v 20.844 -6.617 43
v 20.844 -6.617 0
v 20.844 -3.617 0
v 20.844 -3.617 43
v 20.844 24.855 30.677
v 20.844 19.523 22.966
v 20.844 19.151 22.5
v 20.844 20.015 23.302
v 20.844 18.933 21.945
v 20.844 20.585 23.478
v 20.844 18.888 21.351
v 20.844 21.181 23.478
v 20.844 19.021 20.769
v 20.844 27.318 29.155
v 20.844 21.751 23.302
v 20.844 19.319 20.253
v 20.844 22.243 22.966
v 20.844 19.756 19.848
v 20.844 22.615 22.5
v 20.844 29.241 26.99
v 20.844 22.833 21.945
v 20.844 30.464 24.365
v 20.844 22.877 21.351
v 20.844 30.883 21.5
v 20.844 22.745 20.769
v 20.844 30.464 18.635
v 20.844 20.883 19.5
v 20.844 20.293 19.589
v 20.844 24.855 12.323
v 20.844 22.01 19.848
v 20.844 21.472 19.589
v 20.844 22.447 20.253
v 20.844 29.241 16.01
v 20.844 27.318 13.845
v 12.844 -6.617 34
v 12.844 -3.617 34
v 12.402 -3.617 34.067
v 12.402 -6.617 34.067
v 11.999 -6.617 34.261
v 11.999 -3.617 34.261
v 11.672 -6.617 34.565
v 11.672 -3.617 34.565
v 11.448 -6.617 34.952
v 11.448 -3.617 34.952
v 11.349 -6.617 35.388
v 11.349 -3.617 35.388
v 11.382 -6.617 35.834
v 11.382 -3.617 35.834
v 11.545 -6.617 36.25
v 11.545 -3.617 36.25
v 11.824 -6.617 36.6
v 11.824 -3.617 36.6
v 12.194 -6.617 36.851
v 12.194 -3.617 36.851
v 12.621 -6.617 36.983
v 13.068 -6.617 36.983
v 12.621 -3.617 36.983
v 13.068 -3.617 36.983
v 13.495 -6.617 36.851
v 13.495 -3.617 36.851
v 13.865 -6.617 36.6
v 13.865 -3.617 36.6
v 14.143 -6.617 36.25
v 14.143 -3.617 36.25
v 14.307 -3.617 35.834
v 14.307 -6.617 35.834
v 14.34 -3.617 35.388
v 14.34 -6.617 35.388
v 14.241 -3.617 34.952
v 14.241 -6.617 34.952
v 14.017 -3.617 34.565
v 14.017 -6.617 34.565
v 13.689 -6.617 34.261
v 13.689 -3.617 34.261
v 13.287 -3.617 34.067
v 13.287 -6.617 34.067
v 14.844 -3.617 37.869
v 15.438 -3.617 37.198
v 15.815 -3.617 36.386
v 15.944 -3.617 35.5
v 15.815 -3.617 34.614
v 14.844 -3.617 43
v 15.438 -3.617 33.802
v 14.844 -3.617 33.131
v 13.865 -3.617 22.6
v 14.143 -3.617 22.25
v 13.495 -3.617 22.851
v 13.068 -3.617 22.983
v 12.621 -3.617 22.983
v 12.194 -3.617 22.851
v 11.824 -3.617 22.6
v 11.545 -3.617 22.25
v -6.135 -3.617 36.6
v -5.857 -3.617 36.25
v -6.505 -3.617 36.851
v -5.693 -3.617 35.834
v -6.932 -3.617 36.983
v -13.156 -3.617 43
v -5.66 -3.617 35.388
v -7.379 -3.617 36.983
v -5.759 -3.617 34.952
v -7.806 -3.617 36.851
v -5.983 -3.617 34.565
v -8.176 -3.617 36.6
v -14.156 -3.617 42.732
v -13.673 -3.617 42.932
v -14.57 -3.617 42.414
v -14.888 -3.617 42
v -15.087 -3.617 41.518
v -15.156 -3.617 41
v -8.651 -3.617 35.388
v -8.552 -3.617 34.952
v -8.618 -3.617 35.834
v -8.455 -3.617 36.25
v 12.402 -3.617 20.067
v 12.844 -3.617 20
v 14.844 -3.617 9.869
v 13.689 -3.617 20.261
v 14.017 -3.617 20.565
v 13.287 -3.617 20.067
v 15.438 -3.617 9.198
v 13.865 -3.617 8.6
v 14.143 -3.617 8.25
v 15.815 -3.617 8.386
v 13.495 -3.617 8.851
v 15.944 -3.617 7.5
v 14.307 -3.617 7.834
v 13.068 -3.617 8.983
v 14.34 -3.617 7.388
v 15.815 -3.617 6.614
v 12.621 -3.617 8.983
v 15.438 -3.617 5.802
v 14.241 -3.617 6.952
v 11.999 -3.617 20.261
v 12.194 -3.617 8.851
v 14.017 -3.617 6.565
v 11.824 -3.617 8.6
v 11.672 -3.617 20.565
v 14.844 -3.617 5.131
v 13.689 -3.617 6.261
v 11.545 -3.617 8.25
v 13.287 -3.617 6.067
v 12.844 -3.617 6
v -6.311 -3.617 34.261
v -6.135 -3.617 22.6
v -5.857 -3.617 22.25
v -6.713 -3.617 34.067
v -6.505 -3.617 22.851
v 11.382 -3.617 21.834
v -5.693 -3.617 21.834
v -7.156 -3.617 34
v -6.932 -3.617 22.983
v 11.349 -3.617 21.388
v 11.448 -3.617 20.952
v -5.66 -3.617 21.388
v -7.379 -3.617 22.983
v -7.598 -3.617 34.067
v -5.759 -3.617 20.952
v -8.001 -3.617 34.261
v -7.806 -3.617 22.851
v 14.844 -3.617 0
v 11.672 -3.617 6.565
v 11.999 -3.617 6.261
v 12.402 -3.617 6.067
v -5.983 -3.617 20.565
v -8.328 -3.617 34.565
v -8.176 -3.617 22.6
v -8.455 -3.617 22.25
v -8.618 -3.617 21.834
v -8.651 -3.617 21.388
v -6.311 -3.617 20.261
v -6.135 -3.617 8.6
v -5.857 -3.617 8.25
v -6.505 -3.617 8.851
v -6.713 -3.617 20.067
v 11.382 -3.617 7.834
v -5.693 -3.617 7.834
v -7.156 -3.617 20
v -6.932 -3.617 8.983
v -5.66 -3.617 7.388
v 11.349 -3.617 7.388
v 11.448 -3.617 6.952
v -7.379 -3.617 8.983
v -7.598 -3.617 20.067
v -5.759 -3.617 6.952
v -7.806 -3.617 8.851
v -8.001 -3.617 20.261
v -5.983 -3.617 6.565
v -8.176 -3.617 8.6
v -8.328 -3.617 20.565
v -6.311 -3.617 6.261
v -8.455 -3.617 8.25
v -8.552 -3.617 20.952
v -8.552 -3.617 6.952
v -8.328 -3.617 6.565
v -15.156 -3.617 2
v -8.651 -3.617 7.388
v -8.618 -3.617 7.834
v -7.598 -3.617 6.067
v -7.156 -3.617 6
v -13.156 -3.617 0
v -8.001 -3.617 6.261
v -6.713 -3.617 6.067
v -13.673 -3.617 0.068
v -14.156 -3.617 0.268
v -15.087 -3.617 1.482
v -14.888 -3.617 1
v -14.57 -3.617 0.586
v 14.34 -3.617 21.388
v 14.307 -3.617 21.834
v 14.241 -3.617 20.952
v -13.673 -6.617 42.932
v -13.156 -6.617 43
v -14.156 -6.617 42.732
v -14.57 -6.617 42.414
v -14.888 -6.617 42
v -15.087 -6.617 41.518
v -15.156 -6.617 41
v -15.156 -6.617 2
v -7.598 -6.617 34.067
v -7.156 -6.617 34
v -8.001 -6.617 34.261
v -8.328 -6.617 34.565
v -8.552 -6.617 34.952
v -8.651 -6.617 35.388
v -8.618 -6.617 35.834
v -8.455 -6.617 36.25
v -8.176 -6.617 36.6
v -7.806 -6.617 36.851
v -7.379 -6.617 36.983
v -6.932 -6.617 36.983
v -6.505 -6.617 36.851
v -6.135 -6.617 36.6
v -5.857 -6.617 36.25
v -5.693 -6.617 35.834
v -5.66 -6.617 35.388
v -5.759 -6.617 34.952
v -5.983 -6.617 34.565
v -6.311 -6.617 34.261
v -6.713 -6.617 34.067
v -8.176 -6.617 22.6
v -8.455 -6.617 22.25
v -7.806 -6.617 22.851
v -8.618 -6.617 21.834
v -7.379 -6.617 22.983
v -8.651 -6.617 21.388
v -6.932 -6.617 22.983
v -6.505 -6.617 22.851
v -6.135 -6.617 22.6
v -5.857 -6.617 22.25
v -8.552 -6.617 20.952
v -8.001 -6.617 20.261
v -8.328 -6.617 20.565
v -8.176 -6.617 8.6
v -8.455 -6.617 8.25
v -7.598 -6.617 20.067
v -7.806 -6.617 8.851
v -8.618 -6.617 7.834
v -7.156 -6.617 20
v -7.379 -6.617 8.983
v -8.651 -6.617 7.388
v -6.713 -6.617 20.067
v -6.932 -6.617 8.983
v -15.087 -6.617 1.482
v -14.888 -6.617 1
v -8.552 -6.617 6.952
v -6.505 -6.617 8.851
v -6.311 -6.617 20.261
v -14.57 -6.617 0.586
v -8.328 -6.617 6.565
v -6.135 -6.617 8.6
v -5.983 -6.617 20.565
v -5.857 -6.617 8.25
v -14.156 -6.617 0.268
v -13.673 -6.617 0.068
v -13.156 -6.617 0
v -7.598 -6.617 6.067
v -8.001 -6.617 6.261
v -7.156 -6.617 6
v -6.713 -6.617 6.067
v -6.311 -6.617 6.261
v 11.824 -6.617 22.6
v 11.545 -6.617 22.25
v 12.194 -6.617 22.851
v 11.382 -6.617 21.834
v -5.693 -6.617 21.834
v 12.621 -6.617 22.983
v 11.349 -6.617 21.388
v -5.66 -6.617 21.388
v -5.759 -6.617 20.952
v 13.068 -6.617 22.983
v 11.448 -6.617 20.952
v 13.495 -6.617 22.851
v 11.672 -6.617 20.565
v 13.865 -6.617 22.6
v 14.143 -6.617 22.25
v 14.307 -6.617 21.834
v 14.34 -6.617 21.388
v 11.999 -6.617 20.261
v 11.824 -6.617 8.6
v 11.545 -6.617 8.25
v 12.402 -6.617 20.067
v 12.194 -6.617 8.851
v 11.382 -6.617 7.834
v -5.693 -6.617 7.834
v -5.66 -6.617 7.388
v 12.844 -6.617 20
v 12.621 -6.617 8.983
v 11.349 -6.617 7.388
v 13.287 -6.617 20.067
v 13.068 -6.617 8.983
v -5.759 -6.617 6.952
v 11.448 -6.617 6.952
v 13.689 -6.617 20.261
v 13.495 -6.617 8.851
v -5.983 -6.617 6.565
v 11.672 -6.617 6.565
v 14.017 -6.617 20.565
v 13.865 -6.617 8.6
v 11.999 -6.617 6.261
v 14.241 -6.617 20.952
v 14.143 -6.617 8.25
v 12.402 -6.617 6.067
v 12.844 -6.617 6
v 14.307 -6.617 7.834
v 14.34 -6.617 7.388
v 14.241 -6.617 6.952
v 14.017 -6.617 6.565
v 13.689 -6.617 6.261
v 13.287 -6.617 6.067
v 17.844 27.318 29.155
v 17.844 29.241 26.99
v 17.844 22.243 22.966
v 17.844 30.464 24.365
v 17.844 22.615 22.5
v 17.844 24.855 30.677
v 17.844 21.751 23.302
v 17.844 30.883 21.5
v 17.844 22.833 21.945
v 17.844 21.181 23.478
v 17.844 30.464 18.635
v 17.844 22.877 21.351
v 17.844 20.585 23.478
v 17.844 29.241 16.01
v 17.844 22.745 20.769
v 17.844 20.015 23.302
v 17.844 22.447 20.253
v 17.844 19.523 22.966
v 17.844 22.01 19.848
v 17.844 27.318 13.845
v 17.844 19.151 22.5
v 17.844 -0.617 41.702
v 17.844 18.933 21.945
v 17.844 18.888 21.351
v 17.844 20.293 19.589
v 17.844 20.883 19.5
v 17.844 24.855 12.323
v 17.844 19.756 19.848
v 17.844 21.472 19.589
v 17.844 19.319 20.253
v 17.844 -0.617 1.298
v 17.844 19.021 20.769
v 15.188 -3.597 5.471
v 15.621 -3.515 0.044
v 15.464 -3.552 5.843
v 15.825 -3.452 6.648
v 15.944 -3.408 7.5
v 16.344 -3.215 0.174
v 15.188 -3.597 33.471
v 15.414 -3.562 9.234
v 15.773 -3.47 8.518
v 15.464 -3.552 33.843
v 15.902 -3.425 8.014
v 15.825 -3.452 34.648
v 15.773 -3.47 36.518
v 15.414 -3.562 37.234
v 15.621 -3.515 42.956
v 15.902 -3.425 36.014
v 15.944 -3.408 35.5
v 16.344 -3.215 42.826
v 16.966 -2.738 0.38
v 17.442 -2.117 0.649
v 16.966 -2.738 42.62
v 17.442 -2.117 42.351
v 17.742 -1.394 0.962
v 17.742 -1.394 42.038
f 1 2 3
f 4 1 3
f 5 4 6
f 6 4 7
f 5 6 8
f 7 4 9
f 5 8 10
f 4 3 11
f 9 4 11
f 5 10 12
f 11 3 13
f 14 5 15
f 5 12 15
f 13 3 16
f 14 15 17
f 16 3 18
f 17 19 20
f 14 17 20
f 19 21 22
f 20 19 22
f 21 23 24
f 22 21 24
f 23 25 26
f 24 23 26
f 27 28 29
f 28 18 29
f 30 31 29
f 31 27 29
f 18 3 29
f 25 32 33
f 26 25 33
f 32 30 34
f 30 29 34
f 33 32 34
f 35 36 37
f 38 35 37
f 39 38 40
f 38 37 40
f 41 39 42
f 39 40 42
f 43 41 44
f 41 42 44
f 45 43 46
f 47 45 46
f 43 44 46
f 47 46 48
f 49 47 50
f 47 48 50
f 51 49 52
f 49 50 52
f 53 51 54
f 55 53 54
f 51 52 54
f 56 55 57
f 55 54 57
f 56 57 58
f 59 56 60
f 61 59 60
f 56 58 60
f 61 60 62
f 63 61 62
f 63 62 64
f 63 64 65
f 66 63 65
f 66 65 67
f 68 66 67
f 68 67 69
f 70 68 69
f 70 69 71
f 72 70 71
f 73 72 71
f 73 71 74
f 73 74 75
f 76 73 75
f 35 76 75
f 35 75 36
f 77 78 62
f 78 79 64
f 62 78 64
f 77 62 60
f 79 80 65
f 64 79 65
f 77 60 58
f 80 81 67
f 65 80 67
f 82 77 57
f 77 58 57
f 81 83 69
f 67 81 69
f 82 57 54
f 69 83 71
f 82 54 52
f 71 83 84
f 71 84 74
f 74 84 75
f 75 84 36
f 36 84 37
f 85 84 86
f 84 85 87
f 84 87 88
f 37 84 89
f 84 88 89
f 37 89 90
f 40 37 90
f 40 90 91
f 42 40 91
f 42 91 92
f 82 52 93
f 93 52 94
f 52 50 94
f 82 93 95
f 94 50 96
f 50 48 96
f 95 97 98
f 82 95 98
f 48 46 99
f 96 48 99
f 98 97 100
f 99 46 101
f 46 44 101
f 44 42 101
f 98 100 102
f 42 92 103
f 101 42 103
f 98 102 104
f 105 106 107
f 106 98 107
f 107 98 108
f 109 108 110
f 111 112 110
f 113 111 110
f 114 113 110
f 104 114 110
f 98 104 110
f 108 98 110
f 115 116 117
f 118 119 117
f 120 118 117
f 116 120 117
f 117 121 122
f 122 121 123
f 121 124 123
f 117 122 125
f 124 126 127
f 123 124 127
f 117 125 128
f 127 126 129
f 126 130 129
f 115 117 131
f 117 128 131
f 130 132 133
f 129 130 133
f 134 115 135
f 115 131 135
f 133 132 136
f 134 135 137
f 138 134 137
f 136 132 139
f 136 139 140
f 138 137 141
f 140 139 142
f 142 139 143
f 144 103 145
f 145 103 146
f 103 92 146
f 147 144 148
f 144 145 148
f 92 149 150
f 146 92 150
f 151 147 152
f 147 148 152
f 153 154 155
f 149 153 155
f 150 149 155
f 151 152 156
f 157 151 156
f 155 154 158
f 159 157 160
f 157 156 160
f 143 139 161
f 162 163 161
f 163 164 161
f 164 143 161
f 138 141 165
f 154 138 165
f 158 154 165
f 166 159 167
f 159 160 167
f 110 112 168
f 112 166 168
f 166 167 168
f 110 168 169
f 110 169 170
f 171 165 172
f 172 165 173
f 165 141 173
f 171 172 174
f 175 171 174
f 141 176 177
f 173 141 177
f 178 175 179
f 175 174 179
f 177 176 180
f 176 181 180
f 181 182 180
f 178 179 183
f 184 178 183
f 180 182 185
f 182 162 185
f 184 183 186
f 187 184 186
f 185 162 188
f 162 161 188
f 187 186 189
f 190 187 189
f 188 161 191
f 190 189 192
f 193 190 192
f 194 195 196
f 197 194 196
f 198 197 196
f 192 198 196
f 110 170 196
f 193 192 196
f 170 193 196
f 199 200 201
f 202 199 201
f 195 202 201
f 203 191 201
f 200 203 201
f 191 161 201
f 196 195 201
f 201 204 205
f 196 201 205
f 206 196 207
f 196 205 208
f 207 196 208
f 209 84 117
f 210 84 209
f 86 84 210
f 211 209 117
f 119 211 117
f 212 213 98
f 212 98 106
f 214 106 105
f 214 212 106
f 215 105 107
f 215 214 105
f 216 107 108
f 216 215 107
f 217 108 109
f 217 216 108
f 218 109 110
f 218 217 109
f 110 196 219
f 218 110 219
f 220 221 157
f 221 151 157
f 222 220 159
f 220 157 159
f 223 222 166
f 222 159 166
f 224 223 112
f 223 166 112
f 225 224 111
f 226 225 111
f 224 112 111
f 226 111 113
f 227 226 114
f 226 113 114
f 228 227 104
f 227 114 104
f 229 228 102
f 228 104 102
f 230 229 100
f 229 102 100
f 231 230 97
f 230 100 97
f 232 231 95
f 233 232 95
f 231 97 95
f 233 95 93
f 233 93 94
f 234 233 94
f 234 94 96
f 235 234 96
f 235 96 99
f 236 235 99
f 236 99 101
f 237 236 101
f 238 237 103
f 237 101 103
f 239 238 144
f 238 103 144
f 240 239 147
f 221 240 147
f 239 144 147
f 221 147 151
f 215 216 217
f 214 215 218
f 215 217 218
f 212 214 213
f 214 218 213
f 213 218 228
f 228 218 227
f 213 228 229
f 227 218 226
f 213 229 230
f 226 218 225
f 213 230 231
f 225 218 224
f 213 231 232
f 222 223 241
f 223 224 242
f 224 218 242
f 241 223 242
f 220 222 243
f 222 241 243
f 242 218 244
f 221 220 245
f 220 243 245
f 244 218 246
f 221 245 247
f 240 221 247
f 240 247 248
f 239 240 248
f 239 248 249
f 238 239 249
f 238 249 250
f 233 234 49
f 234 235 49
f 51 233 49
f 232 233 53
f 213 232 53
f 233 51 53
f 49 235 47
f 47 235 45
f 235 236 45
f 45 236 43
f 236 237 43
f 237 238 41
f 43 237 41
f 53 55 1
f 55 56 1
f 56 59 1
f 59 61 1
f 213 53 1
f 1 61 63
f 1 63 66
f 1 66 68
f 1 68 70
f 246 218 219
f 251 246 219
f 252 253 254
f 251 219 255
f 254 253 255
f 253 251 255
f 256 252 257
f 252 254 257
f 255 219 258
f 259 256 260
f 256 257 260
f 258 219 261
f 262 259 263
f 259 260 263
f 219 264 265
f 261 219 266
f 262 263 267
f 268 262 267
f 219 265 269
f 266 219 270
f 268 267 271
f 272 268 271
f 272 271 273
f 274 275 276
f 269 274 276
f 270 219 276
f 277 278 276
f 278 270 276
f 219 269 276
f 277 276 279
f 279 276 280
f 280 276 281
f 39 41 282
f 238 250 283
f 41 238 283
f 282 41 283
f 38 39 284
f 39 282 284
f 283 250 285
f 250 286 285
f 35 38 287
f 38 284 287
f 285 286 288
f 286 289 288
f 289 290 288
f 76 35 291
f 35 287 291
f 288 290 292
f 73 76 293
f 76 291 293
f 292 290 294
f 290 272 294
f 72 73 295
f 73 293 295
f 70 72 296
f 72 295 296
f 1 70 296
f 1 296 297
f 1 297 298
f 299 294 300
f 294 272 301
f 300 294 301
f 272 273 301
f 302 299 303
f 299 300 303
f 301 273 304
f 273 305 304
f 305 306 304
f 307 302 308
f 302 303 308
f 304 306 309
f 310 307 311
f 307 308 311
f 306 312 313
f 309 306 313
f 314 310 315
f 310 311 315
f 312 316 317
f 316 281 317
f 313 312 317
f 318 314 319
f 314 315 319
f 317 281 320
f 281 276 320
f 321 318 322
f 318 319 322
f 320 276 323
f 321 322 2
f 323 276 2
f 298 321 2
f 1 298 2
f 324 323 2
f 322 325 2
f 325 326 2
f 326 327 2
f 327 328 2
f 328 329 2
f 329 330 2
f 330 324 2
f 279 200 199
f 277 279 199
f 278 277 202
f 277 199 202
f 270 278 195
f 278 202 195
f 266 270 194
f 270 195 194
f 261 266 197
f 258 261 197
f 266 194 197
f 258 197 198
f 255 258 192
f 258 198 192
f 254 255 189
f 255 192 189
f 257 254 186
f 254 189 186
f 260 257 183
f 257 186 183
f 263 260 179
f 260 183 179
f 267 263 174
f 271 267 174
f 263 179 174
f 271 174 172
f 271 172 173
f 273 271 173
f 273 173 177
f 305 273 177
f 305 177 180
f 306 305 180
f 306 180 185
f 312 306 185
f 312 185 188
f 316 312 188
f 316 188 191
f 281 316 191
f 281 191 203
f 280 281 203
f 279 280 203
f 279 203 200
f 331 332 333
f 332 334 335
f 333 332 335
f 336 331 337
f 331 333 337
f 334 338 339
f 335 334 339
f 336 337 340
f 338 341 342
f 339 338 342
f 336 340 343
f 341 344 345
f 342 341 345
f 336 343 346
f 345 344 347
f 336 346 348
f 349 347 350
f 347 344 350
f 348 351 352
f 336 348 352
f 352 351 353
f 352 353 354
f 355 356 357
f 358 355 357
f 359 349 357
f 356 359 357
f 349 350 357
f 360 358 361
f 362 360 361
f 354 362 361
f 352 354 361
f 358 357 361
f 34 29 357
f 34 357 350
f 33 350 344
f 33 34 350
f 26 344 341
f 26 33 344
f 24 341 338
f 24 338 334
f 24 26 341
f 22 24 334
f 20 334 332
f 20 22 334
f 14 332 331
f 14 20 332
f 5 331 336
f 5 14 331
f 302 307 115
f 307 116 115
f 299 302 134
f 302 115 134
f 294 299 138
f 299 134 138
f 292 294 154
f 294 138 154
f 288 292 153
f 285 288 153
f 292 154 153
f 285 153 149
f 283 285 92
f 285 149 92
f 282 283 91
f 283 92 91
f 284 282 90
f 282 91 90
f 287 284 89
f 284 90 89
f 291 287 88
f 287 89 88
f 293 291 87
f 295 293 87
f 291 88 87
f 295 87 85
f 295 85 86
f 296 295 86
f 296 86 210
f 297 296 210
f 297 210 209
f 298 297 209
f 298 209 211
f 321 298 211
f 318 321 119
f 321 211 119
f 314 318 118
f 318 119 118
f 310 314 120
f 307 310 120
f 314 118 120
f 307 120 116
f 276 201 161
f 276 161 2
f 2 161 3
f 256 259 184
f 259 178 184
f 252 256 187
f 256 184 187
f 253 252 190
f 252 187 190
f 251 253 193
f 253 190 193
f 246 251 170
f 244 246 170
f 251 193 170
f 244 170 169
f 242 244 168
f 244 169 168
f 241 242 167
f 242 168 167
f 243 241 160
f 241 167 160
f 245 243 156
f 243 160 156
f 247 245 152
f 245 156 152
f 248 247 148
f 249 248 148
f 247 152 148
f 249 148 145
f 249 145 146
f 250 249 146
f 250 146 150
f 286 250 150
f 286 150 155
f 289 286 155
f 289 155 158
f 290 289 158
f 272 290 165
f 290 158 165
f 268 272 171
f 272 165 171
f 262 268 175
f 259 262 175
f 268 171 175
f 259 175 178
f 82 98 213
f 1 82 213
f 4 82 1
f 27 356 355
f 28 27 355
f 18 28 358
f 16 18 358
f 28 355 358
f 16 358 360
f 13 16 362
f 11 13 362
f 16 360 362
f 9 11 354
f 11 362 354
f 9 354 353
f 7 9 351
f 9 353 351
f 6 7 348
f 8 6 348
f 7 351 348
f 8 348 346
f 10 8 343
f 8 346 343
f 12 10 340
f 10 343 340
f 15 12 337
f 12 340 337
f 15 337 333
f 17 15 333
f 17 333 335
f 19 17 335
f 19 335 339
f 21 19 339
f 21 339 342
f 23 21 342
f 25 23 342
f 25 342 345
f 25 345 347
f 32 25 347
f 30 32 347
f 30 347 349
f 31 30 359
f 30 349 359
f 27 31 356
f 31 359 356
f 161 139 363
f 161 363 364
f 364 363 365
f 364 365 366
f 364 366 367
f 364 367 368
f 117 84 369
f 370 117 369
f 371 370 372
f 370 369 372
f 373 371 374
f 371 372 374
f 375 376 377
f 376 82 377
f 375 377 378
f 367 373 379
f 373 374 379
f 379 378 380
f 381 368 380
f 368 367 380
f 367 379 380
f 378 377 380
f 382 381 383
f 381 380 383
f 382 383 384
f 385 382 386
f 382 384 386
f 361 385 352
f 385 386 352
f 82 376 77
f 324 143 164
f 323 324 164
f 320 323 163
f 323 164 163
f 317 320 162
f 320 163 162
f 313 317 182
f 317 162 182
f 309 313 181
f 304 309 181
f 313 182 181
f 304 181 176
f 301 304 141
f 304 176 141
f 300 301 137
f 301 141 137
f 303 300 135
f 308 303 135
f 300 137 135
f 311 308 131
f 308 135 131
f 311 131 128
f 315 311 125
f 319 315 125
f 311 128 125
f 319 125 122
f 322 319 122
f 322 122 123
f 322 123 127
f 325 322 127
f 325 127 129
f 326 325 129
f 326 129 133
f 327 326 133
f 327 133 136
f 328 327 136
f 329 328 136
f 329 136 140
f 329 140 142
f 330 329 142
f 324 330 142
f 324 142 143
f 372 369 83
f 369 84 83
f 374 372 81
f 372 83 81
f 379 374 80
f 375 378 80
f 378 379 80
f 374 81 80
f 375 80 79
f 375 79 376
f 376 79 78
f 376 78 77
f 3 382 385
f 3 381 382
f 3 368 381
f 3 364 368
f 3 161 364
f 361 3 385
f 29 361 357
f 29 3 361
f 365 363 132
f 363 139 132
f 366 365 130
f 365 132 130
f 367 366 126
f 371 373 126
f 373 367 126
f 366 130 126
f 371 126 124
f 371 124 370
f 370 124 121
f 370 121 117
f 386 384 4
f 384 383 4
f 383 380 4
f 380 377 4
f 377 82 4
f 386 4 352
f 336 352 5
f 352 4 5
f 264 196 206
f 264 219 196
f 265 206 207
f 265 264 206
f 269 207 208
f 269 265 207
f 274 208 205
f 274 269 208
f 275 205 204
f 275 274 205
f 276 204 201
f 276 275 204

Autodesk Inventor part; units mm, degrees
ref_plane "YZ Plane" through (0, 0, 0) normal (1, 0, 0) x (0, 1, 0)
ref_plane "XZ Plane" through (0, 0, 0) normal (0, 1, 0) x (-1, 0, 0)
ref_plane "XY Plane" through (0, 0, 0) normal (0, 0, 1) x (1, 0, 0)
sketch "Szkic1" plane through (0, 0, 0) normal (0, 0, 1) x (1, 0, 0)
  line L0 (-15.1556, -3.6171) -> (-15.1556, -6.6171)
  line L1 (-15.1556, -6.6171) -> (20.8444, -6.6171)
  line L2 (20.8444, -6.6171) -> (20.8444, 40.3829)
  line L3 (20.8444, 40.3829) -> (17.8444, 40.3829)
  line L4 (17.8444, 40.3829) -> (17.8444, -3.6171)
  line L5 (17.8444, -3.6171) -> (-15.1556, -3.6171)
  point P0 (0, 0)
  dimension "d0" = 3
  dimension "d1" = 36
  dimension "d2" = 47
  dimension "d3" = 3
extrude "Wyciągnięcie proste1" add sketch "Szkic1" along normal blind 43
fillet "Zaokrąglenie1" radius 3 1 edges at (17.8444, -3.6171, 21.5)
fillet "Zaokrąglenie2" radius 2 2 edges at (-15.1556, -5.1171, 0) (-15.1556, -5.1171, 43)
sketch "Szkic3" plane through (20.8444, -6.6171, 0) normal (0, -1, 0) x (1, 0, 0)
  arc A0 (-34, 43) -> (-36, 41) centre (-34, 41) ccw projected
  line L0 (-36, 2) -> (-36, 41) projected
  arc A1 (-36, 2) -> (-34, 0) centre (-34, 2) ccw projected
  line L1 (-34, 0) -> (0, 0) projected
  line L2 (0, 0) -> (0, 43) projected
  line L3 (-34, 43) -> (0, 43) projected
  point P0 (-20.8444, 0)
  point P1 (-28, 35.5)
  point P2 (-8, 35.5)
  point P3 (-28, 7.5)
  point P4 (-8, 7.5)
  dimension "d40" = 20
  dimension "d41" = 20
  dimension "d42" = 36
  dimension "d43" = 8
  dimension "d44" = 8
  dimension "d45" = 7.5
  dimension "d46" = 7.5
  dimension "d47" = 7.5
  dimension "d48" = 7.5
hole "Otwór3" at (-7.1556, -6.6171, 35.5) at (12.8444, -6.6171, 35.5) at (-7.1556, -6.6171, 7.5) at (12.8444, -6.6171, 7.5) direction (0, 1, 0) diameter 3 end through all
sketch "Szkic4" plane through (20.8444, -6.6171, 0) normal (1, 0, 0) x (0, 0, -1)
  line L0 (0, 0) -> (0, 47) projected
  line L1 (0, 47) -> (-43, 47) projected
  line L2 (-43, 0) -> (-43, 47) projected
  line L3 (0, 0) -> (-43, 0) projected
  line L4 (0, 3) -> (-43, 3) projected
  circle A0 centre (-21.5, 27.5) radius 10
  line L5 (-43, 3) -> (-30.6773, 31.472)
  line L6 (0, 3) -> (-12.3227, 31.472)
  point P0 (0, 6.6171)
  dimension "d57" = 43
  dimension "d58" = 21.5
  dimension "d59" = 27.5
  dimension "d60" = 20
extrude "Wyciągnięcie proste4" cut sketch "Szkic4" against normal blind 10 contours L6 A0 L5 L2 L1 L0
hole "Otwór4" at (20.8444, 20.8829, 21.5) direction (-1, 0, 0) diameter 4 end through all
sketch "Szkic5" plane through (-15.1556, -3.6171, 41) normal (0, 1, 0) x (1, 0, 0)
  circle A0 centre (28, 5.5) radius 1.5 projected
  circle A1 centre (28, 33.5) radius 1.5 projected
  circle A2 centre (28, 5.5) radius 3.1
  circle A3 centre (28, 33.5) radius 1.5 projected
  circle A4 centre (28, 33.5) radius 3.1
  point P0 (15.1556, 41)
  dimension "d70" = 6.2
  dimension "d71" = 6.2
extrude "Wyciągnięcie proste5" cut sketch "Szkic5" along normal blind 10
sketch "Szkic6" plane through (20.8444, -6.6171, 0) normal (0, -1, 0) x (1, 0, 0)
  circle A0 centre (-28, 7.5) radius 1.5 projected
  circle A1 centre (-28, 35.5) radius 1.5 projected
  circle A2 centre (-8, 35.5) radius 1.5 projected
  circle A3 centre (-8, 7.5) radius 1.5 projected
  arc A4 (-34, 43) -> (-36, 41) centre (-34, 41) ccw projected
  line L0 (-36, 2) -> (-36, 41) projected
  arc A5 (-36, 2) -> (-34, 0) centre (-34, 2) ccw projected
  line L1 (-34, 0) -> (0, 0) projected
  line L2 (0, 0) -> (0, 43) projected
  line L3 (-34, 43) -> (0, 43) projected
  point P0 (-20.8444, 0)
  point P1 (-28, 21.5)
  point P2 (-8, 21.5)
  dimension "d74" = 14
  dimension "d75" = 14
  dimension "d76" = 14
  dimension "d77" = 14
hole "Otwór5" at (-7.1556, -6.6171, 21.5) at (12.8444, -6.6171, 21.5) direction (0, 1, 0) diameter 3 end through all
equation "\"d41\" = d40"
equation "\"d43\" = -0.5 * d40 + 0.5 * d42"
equation "\"d44\" = d43"
equation "\"d46\" = d45"
equation "\"d47\" = d45"
equation "\"d48\" = d47"
equation "\"d58\" = 0.5 * d57"
properties part number "CNCM_ALU_X_Axis_Idler_Mounting_Bracket"
